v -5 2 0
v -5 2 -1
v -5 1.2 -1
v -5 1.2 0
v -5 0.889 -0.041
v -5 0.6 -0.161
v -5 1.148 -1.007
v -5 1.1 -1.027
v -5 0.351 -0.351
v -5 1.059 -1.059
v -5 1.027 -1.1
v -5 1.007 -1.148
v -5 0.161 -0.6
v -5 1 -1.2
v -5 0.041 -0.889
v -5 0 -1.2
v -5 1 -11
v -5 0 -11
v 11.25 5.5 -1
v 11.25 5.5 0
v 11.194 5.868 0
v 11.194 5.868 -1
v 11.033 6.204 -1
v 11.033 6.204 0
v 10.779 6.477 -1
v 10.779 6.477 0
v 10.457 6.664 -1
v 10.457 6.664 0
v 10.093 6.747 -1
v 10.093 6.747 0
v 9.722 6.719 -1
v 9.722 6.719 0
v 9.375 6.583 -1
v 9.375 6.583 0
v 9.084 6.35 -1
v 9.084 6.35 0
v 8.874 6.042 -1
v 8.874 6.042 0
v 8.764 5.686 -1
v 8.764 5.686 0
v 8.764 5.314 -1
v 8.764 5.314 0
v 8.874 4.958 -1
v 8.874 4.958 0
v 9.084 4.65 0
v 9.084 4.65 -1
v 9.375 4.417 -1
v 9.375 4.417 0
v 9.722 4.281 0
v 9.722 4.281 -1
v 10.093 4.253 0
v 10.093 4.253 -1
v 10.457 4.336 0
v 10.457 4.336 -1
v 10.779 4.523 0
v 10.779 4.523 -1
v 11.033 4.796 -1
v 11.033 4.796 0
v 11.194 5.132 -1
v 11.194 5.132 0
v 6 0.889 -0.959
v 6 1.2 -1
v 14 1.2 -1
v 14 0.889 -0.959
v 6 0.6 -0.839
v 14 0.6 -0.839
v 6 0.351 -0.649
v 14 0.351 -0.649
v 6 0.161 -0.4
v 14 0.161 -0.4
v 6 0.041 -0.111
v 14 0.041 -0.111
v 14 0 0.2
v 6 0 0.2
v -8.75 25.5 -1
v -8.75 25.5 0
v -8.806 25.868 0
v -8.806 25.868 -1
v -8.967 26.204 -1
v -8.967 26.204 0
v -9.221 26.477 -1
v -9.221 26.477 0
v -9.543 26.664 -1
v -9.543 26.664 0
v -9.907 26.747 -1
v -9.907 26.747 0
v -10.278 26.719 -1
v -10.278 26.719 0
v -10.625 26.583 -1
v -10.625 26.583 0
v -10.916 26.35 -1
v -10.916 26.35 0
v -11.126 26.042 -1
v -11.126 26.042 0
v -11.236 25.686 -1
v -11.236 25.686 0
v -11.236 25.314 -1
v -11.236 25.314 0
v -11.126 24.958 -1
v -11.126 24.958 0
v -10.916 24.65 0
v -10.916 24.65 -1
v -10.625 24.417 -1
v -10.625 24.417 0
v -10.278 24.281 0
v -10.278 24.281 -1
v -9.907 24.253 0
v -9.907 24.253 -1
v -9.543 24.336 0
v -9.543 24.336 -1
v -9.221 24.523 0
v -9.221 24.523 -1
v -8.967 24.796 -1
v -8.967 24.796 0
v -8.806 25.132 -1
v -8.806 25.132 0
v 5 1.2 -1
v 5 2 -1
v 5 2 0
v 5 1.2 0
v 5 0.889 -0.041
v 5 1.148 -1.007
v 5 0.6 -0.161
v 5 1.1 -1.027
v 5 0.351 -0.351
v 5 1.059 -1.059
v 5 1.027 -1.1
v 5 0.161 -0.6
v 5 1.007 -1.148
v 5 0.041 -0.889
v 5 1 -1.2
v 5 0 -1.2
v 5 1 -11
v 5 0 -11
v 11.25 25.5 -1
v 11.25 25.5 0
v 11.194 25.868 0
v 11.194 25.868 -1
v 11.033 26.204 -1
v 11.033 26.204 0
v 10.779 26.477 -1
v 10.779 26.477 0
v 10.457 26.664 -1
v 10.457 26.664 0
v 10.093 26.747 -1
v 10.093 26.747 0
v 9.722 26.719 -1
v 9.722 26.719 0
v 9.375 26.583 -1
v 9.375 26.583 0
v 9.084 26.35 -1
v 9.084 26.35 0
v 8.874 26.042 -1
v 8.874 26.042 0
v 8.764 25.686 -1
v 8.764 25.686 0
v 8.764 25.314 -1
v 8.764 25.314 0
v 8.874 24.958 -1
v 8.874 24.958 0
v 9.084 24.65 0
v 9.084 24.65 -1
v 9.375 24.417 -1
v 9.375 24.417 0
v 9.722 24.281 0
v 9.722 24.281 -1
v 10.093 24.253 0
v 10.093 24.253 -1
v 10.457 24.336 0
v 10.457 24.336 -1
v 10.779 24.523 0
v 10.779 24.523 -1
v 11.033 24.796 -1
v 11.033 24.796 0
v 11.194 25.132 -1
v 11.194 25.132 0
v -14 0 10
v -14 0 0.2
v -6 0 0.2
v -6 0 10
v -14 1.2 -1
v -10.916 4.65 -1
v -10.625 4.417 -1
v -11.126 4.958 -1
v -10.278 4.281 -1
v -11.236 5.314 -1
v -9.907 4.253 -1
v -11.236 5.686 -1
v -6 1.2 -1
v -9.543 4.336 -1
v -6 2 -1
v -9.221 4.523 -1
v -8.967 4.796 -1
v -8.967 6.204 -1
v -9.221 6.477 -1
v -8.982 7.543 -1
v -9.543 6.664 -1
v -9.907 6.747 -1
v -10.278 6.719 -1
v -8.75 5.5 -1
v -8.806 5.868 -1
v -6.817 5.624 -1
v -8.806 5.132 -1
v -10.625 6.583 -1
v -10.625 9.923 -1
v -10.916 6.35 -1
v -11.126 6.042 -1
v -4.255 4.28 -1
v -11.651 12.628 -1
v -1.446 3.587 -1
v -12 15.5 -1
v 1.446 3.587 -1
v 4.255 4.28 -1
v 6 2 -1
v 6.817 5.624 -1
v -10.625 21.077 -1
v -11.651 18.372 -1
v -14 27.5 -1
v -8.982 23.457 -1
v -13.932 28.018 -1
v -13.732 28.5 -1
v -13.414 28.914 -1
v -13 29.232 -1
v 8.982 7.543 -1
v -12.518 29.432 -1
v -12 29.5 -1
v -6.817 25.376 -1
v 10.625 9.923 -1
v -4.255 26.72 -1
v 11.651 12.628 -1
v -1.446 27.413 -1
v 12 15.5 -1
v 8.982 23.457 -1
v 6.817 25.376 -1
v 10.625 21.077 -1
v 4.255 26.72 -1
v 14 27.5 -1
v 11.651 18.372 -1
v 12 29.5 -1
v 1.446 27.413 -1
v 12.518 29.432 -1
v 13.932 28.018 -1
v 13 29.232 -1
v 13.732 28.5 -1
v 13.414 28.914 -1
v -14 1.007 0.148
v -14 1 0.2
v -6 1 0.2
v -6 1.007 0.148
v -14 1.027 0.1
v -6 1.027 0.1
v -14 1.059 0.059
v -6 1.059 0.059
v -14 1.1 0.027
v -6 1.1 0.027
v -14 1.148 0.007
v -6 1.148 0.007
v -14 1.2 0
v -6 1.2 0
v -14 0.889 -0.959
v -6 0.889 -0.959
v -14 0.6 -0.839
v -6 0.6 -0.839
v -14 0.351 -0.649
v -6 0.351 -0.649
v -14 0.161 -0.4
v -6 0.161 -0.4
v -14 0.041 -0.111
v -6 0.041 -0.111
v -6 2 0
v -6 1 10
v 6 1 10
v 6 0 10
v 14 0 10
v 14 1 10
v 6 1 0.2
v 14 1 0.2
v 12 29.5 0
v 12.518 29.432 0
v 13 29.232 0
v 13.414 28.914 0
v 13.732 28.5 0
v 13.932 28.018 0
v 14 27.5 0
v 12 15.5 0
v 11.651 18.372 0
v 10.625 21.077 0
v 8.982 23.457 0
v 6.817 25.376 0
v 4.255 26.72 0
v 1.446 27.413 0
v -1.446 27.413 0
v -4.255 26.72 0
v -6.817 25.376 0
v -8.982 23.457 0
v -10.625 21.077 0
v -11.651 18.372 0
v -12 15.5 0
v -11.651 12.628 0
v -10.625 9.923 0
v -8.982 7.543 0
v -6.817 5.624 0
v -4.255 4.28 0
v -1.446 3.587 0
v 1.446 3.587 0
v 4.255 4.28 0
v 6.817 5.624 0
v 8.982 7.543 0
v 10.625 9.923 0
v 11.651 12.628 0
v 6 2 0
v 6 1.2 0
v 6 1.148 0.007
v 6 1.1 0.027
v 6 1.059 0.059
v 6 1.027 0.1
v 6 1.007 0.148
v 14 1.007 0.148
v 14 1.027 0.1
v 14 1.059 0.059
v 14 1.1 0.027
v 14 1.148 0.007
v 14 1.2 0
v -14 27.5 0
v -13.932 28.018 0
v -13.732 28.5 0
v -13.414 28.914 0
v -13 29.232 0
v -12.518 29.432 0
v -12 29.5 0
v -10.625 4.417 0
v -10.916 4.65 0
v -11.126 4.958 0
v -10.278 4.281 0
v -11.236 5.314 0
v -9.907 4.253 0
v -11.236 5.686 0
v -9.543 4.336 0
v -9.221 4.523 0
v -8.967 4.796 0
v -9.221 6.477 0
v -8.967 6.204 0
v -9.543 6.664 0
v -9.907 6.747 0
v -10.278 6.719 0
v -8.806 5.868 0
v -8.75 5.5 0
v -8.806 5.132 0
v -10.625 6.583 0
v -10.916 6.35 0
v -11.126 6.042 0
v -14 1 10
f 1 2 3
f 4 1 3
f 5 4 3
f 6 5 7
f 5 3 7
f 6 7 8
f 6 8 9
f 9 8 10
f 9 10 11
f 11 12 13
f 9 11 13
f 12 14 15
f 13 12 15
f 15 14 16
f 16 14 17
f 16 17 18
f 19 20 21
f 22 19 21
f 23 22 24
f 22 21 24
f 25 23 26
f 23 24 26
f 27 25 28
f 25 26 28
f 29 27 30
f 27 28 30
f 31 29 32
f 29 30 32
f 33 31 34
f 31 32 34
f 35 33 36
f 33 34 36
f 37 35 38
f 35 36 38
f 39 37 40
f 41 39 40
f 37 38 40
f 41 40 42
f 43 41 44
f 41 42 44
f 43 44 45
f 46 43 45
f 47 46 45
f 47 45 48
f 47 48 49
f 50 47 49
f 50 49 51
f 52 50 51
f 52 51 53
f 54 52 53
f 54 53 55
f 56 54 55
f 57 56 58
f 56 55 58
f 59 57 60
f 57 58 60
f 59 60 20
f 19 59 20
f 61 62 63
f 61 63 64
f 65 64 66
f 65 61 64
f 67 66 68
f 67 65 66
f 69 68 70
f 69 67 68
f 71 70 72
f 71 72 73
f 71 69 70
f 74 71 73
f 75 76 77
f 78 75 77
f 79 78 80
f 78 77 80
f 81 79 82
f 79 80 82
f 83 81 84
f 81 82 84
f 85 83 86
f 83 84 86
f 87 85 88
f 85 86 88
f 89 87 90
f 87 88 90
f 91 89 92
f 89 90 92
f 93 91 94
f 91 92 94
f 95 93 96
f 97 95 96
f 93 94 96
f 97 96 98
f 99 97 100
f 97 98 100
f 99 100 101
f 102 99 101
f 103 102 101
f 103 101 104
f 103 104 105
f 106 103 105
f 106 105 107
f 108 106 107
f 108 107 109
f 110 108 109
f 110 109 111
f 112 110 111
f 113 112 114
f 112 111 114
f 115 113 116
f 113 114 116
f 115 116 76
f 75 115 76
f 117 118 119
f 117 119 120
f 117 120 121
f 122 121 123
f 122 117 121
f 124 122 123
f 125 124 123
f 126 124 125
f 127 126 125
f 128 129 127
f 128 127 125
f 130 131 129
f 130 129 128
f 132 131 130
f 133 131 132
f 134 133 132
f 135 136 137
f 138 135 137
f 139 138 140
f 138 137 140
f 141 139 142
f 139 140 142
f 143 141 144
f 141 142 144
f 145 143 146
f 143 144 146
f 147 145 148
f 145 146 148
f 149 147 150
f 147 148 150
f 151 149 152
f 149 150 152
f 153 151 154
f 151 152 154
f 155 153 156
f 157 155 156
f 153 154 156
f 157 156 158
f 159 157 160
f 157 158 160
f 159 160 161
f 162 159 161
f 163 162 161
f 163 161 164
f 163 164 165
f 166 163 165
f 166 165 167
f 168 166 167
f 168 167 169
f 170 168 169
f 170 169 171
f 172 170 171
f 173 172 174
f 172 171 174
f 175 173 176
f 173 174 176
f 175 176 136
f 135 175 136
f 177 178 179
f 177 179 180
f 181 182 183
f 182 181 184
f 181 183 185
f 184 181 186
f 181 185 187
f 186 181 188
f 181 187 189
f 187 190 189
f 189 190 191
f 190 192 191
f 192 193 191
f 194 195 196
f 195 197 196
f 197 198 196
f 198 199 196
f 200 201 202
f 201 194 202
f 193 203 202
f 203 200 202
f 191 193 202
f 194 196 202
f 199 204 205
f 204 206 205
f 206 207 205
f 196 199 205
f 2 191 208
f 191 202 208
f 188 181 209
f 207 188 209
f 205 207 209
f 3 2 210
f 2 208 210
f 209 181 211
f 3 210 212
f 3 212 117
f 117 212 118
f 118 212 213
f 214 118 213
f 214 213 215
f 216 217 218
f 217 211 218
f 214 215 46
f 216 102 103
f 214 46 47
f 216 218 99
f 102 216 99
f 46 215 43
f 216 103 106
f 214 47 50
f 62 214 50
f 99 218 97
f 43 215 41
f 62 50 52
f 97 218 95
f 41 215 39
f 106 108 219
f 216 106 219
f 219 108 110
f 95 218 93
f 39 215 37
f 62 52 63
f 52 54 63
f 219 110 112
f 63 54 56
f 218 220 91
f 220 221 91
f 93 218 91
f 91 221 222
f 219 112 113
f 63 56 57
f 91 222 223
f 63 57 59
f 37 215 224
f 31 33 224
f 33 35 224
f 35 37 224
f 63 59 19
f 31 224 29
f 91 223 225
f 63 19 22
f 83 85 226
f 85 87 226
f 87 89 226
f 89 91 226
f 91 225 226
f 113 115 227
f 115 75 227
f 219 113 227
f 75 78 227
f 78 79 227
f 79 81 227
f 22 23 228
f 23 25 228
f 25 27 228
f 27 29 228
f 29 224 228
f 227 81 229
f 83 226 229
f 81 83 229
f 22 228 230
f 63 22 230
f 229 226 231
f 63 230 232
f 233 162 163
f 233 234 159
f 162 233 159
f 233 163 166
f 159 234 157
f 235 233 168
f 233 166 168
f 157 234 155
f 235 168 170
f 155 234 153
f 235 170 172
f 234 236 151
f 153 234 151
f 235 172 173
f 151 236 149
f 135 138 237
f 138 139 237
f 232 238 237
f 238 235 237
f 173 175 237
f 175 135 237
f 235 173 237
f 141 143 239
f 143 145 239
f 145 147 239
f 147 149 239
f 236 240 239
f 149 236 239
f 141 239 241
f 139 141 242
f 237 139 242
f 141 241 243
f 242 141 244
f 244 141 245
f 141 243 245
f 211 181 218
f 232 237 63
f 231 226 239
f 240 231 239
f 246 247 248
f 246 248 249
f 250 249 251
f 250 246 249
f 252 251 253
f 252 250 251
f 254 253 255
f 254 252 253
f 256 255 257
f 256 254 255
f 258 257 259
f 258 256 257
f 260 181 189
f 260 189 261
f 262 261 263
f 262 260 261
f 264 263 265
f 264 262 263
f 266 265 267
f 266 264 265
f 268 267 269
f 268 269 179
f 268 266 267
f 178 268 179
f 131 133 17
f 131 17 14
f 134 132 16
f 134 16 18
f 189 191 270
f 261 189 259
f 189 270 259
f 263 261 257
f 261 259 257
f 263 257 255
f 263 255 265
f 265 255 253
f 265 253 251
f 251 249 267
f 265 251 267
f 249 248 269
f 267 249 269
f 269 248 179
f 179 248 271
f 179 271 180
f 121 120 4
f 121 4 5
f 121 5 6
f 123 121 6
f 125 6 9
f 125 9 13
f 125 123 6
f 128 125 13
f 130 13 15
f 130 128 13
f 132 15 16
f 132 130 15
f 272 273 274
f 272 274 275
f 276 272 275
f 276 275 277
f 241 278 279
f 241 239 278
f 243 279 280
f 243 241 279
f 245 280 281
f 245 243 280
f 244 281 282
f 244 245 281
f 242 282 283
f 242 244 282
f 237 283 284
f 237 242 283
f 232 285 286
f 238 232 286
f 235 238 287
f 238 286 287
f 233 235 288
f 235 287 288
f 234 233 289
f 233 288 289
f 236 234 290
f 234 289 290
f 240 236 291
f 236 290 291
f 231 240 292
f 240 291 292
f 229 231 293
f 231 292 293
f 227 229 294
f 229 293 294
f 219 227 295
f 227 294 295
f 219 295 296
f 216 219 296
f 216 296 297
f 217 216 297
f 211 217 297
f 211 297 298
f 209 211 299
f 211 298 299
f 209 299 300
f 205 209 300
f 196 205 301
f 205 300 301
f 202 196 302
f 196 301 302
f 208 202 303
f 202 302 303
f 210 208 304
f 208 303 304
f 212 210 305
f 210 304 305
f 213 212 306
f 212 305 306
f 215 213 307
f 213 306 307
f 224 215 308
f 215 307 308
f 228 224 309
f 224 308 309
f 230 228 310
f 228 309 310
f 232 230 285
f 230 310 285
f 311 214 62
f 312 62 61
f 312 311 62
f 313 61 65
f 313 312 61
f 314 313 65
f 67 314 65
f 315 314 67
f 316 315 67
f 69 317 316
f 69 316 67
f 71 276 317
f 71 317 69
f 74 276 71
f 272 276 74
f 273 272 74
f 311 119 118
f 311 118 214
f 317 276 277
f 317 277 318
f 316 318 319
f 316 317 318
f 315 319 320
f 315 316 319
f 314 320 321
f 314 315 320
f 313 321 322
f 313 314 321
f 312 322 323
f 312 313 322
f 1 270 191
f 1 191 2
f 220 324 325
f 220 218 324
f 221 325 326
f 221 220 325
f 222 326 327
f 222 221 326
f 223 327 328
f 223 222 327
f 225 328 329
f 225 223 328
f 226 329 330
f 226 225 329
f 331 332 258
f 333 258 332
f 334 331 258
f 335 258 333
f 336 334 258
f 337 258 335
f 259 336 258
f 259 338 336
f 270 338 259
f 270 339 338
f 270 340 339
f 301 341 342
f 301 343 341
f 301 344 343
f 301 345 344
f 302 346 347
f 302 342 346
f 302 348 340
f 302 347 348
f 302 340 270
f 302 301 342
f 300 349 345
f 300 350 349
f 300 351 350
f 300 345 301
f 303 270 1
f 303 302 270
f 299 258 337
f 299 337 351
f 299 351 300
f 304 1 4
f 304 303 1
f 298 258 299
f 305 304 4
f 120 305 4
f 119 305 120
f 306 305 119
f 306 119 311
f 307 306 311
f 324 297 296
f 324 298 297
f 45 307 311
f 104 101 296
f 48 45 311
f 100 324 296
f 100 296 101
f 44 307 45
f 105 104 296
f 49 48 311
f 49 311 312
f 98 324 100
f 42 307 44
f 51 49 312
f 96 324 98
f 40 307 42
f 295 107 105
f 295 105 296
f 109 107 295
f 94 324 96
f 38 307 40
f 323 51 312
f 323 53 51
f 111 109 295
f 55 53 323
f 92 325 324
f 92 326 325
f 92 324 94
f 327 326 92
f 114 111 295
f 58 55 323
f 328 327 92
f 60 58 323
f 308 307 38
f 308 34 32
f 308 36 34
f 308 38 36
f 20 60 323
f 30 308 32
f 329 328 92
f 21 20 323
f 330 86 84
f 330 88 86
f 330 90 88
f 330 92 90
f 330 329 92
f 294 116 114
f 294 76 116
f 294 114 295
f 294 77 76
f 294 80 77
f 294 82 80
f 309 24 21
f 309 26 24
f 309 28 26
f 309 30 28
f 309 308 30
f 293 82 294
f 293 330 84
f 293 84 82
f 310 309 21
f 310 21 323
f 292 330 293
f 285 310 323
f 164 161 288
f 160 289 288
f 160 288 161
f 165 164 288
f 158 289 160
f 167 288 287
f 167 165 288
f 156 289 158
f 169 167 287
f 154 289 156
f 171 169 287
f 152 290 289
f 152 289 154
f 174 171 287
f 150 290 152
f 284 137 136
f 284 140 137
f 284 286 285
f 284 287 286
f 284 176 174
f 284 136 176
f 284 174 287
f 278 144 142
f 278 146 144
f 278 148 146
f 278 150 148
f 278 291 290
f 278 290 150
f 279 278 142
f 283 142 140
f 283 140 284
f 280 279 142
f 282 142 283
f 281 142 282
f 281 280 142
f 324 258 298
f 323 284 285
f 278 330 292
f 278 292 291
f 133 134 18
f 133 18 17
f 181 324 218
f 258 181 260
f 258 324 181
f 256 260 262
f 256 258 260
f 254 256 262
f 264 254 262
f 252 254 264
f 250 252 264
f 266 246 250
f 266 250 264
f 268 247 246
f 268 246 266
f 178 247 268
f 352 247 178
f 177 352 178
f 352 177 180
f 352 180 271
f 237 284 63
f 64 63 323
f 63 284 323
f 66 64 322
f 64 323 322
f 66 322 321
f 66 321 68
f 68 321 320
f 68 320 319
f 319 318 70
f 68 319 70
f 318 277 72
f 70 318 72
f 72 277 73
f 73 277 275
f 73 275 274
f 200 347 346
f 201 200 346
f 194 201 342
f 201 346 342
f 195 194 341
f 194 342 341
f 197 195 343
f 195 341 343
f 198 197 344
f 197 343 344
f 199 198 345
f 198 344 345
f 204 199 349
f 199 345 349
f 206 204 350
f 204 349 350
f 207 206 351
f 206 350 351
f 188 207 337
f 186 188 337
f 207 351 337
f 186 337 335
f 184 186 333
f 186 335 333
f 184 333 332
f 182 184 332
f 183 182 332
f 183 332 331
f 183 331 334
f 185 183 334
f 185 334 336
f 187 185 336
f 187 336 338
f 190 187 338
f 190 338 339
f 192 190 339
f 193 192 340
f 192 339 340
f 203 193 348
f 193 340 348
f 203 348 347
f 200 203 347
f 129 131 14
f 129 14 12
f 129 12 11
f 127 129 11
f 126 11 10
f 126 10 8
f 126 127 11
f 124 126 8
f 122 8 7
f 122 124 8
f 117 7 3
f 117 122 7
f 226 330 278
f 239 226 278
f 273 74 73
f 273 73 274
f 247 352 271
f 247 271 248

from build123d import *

# Parameters (mm, degrees)
SKIZZE1_W                       = 28
SKIZZE1_H                       = 29.5
SKIZZE1_R                       = 1.25
SKIZZE1_R_2                     = 12
BASIS_BLECH1_DEPTH              = 1
VERRUNDUNG1_R                   = 2
SKIZZE9_W                       = 1
SKIZZE9_H                       = 2
SCHNITT_LINEAR_AUSTRAGEN1_DEPTH = 33.668792448
KANTE_LASCHE2_STRIP_W           = 4.4
KANTE_LASCHE2_STRIP_H           = 1
KANTE_LASCHE2_STRIP_CUT_DEPTH   = 8
KANTE_LASCHE2_STRIP_2_W         = 4.4
KANTE_LASCHE2_STRIP_2_H         = 1
KANTE_LASCHE2_STRIP_CUT_2_DEPTH = 8
KANTE_LASCHE2_DEPTH             = 8
KANTE_LASCHE2_BEND_DEPTH        = 8
KANTE_LASCHE3_STRIP_W           = 4.4
KANTE_LASCHE3_STRIP_H           = 1
KANTE_LASCHE3_STRIP_CUT_DEPTH   = 10
KANTE_LASCHE3_DEPTH             = 10


# Sheet-metal steps are written as plain solids
with BuildPart() as part:
    # Skizze1 → Basis-Blech1 (new body)
    with BuildSketch(Plane.XY):
        with Locations((0, 14.75)):
            Rectangle(SKIZZE1_W, SKIZZE1_H)
        with Locations((-10, 25.5)):
            Circle(SKIZZE1_R, mode=Mode.SUBTRACT)
        with Locations((10, 25.5)):
            Circle(SKIZZE1_R, mode=Mode.SUBTRACT)
        with Locations((10, 5.5)):
            Circle(SKIZZE1_R, mode=Mode.SUBTRACT)
        with Locations((-10, 5.5)):
            Circle(SKIZZE1_R, mode=Mode.SUBTRACT)
        with Locations((0, 15.5)):
            Circle(SKIZZE1_R_2, mode=Mode.SUBTRACT)
    extrude(amount=-BASIS_BLECH1_DEPTH)

    # Verrundung1
    verrundung1_edges = [part.edges().sort_by_distance(p)[0] for p in [
        (-14, 29.5, -0.5),
        (14, 29.5, -0.5),
    ]]
    fillet(verrundung1_edges, radius=VERRUNDUNG1_R)

    # Skizze9 → Schnitt-Linear austragen1 (cut, through all)
    with BuildSketch(Plane.XY):
        with Locations((-5.5, 1)):
            Rectangle(SKIZZE9_W, SKIZZE9_H)
        with Locations((5.5, 1)):
            Rectangle(SKIZZE9_W, SKIZZE9_H)
    extrude(amount=-SCHNITT_LINEAR_AUSTRAGEN1_DEPTH, mode=Mode.SUBTRACT)

    # Kante-Lasche2 strip (across the edge) → Kante-Lasche2 strip cut (cut)
    with BuildSketch(Plane.YZ.offset(-14)):
        with Locations((-1, -0.5)):
            Rectangle(KANTE_LASCHE2_STRIP_W, KANTE_LASCHE2_STRIP_H)
    extrude(amount=KANTE_LASCHE2_STRIP_CUT_DEPTH, mode=Mode.SUBTRACT)

    # Kante-Lasche2 strip 2 (across the edge) → Kante-Lasche2 strip cut 2 (cut)
    with BuildSketch(Plane.YZ.offset(6)):
        with Locations((-1, -0.5)):
            Rectangle(KANTE_LASCHE2_STRIP_2_W, KANTE_LASCHE2_STRIP_2_H)
    extrude(amount=KANTE_LASCHE2_STRIP_CUT_2_DEPTH, mode=Mode.SUBTRACT)

    # Kante-Lasche2 section (across the edge) → Kante-Lasche2 (add)
    with BuildSketch(Plane.YZ.offset(-14)):
        with BuildLine():
            Line((0, 0.2), (0, 10))
            Line((0, 10), (1, 10))
            Line((1, 10), (1, 0.2))
            ThreePointArc((1, 0.2), (1.058578644, 0.058578644), (1.2, 0))
            Line((1.2, 0), (1.2, -1))
            ThreePointArc((1.2, -1), (0.351471863, -0.648528137), (0, 0.2))
        make_face()
    extrude(amount=KANTE_LASCHE2_DEPTH)

    # Kante-Lasche2 section 2 (across the edge) → Kante-Lasche2 bend (add)
    with BuildSketch(Plane.YZ.offset(6)):
        with BuildLine():
            Line((0, 0.2), (0, 10))
            Line((0, 10), (1, 10))
            Line((1, 10), (1, 0.2))
            ThreePointArc((1, 0.2), (1.058578644, 0.058578644), (1.2, 0))
            Line((1.2, 0), (1.2, -1))
            ThreePointArc((1.2, -1), (0.351471863, -0.648528137), (0, 0.2))
        make_face()
    extrude(amount=KANTE_LASCHE2_BEND_DEPTH)

    # Kante-Lasche3 strip (across the edge) → Kante-Lasche3 strip cut (cut)
    with BuildSketch(Plane(origin=(5, 0, -1), x_dir=(0, 1, 0), z_dir=(-1, 0, 0))):
        with Locations((-1, -0.5)):
            Rectangle(KANTE_LASCHE3_STRIP_W, KANTE_LASCHE3_STRIP_H)
    extrude(amount=KANTE_LASCHE3_STRIP_CUT_DEPTH, mode=Mode.SUBTRACT)

    # Kante-Lasche3 section (across the edge) → Kante-Lasche3 (add)
    with BuildSketch(Plane(origin=(5, 0, -1), x_dir=(0, 1, 0), z_dir=(-1, 0, 0))):
        with BuildLine():
            Line((0, 0.2), (0, 10))
            Line((0, 10), (1, 10))
            Line((1, 10), (1, 0.2))
            ThreePointArc((1, 0.2), (1.058578644, 0.058578644), (1.2, 0))
            Line((1.2, 0), (1.2, -1))
            ThreePointArc((1.2, -1), (0.351471863, -0.648528137), (0, 0.2))
        make_face()
    extrude(amount=KANTE_LASCHE3_DEPTH)


solid = part.part
